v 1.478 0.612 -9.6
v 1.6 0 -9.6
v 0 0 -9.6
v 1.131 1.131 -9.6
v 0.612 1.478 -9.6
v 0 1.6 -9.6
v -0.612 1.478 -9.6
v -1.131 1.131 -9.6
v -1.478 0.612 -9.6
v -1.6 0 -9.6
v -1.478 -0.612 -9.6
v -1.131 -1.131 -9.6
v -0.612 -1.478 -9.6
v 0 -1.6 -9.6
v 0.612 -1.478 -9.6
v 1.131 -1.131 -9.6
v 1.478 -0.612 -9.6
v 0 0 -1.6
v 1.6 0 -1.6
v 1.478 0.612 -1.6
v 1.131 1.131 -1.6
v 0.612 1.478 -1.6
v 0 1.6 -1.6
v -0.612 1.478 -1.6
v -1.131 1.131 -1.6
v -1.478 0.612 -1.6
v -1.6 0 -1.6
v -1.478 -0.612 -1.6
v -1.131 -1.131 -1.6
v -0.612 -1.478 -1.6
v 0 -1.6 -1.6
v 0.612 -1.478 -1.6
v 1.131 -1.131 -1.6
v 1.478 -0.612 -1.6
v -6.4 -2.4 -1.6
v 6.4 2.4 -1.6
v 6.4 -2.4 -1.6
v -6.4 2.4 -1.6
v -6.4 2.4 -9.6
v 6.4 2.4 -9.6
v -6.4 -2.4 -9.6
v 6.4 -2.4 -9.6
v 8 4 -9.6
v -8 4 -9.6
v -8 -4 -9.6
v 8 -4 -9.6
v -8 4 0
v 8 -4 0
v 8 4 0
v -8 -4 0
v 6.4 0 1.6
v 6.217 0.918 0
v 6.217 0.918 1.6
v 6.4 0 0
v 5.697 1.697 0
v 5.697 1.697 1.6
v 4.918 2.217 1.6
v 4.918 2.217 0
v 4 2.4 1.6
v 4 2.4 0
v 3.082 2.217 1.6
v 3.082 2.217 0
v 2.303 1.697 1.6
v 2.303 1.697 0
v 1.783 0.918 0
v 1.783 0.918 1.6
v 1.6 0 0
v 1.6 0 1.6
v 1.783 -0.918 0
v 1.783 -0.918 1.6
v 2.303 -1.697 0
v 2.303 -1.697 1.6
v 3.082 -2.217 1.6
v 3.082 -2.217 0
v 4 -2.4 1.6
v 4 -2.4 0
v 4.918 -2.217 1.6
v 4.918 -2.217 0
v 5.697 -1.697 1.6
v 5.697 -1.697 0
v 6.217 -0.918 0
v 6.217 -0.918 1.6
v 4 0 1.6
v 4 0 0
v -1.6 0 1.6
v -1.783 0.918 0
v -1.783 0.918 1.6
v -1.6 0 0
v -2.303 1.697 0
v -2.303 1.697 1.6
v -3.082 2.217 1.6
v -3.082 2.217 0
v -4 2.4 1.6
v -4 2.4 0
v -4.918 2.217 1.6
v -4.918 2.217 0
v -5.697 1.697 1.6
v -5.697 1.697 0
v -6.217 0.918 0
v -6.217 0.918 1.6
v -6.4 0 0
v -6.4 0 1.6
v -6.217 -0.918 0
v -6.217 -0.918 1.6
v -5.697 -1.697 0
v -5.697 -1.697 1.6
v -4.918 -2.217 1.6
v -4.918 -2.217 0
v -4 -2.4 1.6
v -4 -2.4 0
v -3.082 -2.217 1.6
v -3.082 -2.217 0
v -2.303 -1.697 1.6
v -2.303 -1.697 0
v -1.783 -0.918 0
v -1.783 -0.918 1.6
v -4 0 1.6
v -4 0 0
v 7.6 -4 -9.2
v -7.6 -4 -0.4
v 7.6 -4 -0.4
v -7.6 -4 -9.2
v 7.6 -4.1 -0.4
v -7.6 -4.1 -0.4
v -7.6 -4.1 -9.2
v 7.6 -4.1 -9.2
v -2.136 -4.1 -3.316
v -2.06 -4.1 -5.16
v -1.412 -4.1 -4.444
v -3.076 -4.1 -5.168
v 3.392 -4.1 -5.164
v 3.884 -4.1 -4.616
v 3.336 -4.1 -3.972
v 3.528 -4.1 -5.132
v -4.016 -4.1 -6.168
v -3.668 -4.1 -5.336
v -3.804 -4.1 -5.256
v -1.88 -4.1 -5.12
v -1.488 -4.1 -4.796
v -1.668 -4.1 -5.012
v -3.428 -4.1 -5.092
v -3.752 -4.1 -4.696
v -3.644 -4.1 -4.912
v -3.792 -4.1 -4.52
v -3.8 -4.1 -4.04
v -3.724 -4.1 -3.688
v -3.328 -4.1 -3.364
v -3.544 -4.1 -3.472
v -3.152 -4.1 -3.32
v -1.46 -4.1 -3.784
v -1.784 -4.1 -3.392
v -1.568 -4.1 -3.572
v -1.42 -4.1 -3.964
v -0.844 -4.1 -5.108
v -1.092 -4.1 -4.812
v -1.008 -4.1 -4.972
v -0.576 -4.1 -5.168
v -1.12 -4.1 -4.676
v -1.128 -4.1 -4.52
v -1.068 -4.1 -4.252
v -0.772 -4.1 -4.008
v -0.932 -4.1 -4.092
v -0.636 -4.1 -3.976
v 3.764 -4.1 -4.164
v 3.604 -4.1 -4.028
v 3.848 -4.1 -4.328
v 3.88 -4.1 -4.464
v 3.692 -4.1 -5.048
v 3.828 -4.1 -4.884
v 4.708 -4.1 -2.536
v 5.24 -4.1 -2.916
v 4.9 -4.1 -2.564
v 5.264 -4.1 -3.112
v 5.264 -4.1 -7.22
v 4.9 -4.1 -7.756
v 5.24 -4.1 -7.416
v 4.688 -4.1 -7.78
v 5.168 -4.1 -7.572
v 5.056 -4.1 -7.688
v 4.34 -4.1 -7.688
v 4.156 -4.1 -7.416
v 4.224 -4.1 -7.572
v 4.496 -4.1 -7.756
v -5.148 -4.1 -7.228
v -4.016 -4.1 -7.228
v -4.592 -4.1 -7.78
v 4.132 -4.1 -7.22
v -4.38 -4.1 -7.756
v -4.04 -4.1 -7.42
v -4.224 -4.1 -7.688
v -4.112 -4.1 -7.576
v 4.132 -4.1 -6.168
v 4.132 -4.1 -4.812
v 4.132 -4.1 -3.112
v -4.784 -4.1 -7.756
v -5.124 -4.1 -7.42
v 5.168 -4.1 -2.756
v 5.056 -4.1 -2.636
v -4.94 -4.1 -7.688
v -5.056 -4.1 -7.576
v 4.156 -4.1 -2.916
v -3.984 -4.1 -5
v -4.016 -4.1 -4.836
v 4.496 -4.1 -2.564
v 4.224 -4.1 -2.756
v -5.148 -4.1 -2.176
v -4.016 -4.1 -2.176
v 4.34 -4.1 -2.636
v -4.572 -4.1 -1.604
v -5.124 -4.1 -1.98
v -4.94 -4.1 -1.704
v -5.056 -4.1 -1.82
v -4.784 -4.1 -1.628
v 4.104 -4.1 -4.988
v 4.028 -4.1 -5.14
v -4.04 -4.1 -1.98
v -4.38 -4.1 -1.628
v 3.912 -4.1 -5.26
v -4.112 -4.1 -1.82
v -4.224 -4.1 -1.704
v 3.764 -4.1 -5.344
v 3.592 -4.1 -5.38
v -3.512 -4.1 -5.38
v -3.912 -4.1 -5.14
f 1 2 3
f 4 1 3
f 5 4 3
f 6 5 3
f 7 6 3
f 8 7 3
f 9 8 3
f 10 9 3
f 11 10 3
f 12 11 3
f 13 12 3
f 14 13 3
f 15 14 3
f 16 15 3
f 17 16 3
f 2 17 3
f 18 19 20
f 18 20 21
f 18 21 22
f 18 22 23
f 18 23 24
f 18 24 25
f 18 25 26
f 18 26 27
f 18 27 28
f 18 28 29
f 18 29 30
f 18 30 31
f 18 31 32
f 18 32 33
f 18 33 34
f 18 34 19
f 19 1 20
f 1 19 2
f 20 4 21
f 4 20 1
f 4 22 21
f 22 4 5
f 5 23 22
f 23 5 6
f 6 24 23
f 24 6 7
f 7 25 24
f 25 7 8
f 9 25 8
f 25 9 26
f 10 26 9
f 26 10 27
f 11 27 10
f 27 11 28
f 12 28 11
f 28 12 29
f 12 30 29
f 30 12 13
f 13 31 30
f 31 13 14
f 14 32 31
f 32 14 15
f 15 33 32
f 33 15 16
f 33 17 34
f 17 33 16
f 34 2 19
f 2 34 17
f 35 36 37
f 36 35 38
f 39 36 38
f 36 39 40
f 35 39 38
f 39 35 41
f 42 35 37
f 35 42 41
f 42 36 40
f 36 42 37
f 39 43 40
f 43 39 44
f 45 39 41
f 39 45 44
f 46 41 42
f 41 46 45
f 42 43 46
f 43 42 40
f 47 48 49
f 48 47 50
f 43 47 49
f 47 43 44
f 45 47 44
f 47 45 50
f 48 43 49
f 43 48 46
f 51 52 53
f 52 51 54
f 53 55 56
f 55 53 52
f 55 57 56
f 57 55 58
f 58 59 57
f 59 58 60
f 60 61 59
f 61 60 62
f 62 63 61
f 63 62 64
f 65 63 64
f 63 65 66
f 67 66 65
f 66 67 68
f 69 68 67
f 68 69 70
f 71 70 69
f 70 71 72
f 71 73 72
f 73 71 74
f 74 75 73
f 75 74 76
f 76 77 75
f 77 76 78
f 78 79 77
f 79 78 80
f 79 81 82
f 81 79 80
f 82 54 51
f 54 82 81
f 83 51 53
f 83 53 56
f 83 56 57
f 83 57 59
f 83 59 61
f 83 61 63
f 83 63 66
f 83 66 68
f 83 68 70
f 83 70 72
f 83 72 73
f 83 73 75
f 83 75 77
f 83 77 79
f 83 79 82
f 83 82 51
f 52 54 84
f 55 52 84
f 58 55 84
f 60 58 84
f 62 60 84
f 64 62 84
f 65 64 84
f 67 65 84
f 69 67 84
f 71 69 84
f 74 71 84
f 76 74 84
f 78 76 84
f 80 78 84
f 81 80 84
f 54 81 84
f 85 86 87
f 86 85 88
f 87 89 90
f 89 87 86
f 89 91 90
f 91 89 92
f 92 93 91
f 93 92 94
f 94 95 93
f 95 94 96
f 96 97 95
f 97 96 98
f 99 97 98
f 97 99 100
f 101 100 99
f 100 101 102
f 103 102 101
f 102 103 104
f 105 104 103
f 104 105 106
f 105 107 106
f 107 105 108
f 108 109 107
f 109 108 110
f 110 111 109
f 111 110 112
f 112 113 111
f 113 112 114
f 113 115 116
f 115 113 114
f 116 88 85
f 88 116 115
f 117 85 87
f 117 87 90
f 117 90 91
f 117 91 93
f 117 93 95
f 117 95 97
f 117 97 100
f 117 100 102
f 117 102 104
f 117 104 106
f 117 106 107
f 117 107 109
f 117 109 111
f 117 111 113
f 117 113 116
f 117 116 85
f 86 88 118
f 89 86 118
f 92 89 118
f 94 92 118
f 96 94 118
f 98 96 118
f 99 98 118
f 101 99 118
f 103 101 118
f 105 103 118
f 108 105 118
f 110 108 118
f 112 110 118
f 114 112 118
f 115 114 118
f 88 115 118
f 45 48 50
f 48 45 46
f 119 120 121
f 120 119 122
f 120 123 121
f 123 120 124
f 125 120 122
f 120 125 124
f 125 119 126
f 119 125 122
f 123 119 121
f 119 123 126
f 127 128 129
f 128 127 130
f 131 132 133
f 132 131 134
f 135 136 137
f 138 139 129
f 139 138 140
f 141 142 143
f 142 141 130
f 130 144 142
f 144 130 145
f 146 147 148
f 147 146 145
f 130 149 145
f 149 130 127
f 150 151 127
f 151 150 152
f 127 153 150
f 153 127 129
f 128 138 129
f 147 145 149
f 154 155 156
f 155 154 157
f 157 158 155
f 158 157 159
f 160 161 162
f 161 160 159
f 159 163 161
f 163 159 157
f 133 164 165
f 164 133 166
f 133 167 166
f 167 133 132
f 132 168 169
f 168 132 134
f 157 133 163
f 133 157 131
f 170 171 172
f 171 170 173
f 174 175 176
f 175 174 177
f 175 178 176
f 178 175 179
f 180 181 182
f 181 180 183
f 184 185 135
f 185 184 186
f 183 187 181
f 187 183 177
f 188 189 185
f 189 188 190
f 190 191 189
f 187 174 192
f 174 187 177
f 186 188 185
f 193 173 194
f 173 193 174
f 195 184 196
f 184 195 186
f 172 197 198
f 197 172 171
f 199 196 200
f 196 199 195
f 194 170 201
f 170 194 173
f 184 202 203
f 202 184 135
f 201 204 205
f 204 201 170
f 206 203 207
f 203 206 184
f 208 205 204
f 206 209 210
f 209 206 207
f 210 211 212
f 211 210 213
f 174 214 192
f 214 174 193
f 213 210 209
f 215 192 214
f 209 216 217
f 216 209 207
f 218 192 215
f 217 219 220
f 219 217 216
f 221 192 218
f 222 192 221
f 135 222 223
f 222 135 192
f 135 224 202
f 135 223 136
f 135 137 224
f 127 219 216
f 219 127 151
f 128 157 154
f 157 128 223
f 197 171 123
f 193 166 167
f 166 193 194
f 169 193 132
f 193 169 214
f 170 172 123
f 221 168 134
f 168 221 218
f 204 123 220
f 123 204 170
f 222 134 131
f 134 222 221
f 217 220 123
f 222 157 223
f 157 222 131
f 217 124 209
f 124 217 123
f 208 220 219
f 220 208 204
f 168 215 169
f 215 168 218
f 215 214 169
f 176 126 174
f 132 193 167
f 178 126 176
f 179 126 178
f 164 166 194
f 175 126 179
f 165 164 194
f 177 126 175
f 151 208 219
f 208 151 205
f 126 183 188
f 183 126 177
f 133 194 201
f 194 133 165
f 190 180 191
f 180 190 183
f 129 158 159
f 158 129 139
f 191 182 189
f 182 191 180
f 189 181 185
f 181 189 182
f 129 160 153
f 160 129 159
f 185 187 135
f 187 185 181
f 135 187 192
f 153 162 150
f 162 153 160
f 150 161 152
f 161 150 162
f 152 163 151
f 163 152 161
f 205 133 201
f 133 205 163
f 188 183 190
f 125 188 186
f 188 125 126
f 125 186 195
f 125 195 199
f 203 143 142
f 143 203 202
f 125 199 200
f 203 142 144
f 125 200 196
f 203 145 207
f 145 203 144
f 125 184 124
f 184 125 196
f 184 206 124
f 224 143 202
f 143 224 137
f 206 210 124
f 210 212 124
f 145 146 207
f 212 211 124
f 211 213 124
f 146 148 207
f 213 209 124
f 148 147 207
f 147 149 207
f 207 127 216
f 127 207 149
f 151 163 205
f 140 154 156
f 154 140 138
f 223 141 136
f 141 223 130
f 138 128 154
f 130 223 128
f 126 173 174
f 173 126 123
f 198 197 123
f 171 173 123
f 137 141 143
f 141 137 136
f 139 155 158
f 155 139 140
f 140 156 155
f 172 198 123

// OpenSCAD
// file: ../p/4-4edge.scad
use <../lib.scad>
function ldraw_lib__4_4edge() = [
// 0 Circle 1.0
// 0 Name: 4-4edge.dat
// 0 Author: James Jessiman
// 0 !LDRAW_ORG Primitive UPDATE 2017-01
// 0 !LICENSE Licensed under CC BY 2.0 and CC BY 4.0 : see CAreadme.txt
// 
// 0 BFC CERTIFY CCW
  [0,"BFC","CERTIFY"],
  [0,"BFC","CCW"],
// 
// 0 !HISTORY 1998-12-15 [PTadmin] Official Update 1998-10
// 0 !HISTORY 2005-12-28 [PTadmin] Official Update 2005-01
// 0 !HISTORY 2007-06-24 [PTadmin] Header formatted for Contributor Agreement
// 0 !HISTORY 2008-07-01 [PTadmin] Official Update 2008-01
// 0 !HISTORY 2017-01-15 [Steffen] BFCed
// 0 !HISTORY 2017-12-30 [PTadmin] Official Update 2017-01
// 
// 
// 2 24 1 0 0 0.9239 0 0.3827
  [2,24,1,0,0,0.9239,0,0.3827],
// 2 24 0.9239 0 0.3827 0.7071 0 0.7071
  [2,24,0.9239,0,0.3827,0.7071,0,0.7071],
// 2 24 0.7071 0 0.7071 0.3827 0 0.9239
  [2,24,0.7071,0,0.7071,0.3827,0,0.9239],
// 2 24 0.3827 0 0.9239 0 0 1
  [2,24,0.3827,0,0.9239,0,0,1],
// 2 24 0 0 1 -0.3827 0 0.9239
  [2,24,0,0,1,-0.3827,0,0.9239],
// 2 24 -0.3827 0 0.9239 -0.7071 0 0.7071
  [2,24,-0.3827,0,0.9239,-0.7071,0,0.7071],
// 2 24 -0.7071 0 0.7071 -0.9239 0 0.3827
  [2,24,-0.7071,0,0.7071,-0.9239,0,0.3827],
// 2 24 -0.9239 0 0.3827 -1 0 -0
  [2,24,-0.9239,0,0.3827,-1,0,-0],
// 2 24 -1 0 -0 -0.9239 0 -0.3827
  [2,24,-1,0,-0,-0.9239,0,-0.3827],
// 2 24 -0.9239 0 -0.3827 -0.7071 0 -0.7071
  [2,24,-0.9239,0,-0.3827,-0.7071,0,-0.7071],
// 2 24 -0.7071 0 -0.7071 -0.3827 0 -0.9239
  [2,24,-0.7071,0,-0.7071,-0.3827,0,-0.9239],
// 2 24 -0.3827 0 -0.9239 0 0 -1
  [2,24,-0.3827,0,-0.9239,0,0,-1],
// 2 24 0 0 -1 0.3827 0 -0.9239
  [2,24,0,0,-1,0.3827,0,-0.9239],
// 2 24 0.3827 0 -0.9239 0.7071 0 -0.7071
  [2,24,0.3827,0,-0.9239,0.7071,0,-0.7071],
// 2 24 0.7071 0 -0.7071 0.9239 0 -0.3827
  [2,24,0.7071,0,-0.7071,0.9239,0,-0.3827],
// 2 24 0.9239 0 -0.3827 1 0 0
  [2,24,0.9239,0,-0.3827,1,0,0],
];
module ldraw_lib__4_4edge(step=0, col=false, unit=2/5, alt=false, line=0.2, solid=!$preview)
    makepoly(ldraw_lib__4_4edge(), step=step, col=col, unit=unit, alt=alt, line=line, solid=solid);
ldraw_lib__4_4edge(line=0.2);
// file: ../p/4-4disc.scad
use <../lib.scad>
function ldraw_lib__4_4disc() = [
// 0 Disc 1.0
// 0 Name: 4-4disc.dat
// 0 Author: James Jessiman
// 0 !LDRAW_ORG Primitive UPDATE 2002-02
// 0 !LICENSE Licensed under CC BY 2.0 and CC BY 4.0 : see CAreadme.txt
// 
// 0 BFC CERTIFY CCW
  [0,"BFC","CERTIFY"],
  [0,"BFC","CCW"],
// 
// 0 !HISTORY 1998-12-15 [PTadmin] Official Update 1998-10
// 0 !HISTORY 2002-03-23 [sbliss] Added BFC statement
// 0 !HISTORY 2002-04-25 [PTadmin] Official Update 2002-02
// 0 !HISTORY 2007-06-24 [PTadmin] Header formatted for Contributor Agreement
// 0 !HISTORY 2008-07-01 [PTadmin] Official Update 2008-01
// 
// 
// 3 16 0 0 0 1 0 0 0.9239 0 0.3827
  [3,16,0,0,0,1,0,0,0.9239,0,0.3827],
// 3 16 0 0 0 0.9239 0 0.3827 0.7071 0 0.7071
  [3,16,0,0,0,0.9239,0,0.3827,0.7071,0,0.7071],
// 3 16 0 0 0 0.7071 0 0.7071 0.3827 0 0.9239
  [3,16,0,0,0,0.7071,0,0.7071,0.3827,0,0.9239],
// 3 16 0 0 0 0.3827 0 0.9239 0 0 1
  [3,16,0,0,0,0.3827,0,0.9239,0,0,1],
// 3 16 0 0 0 0 0 1 -0.3827 0 0.9239
  [3,16,0,0,0,0,0,1,-0.3827,0,0.9239],
// 3 16 0 0 0 -0.3827 0 0.9239 -0.7071 0 0.7071
  [3,16,0,0,0,-0.3827,0,0.9239,-0.7071,0,0.7071],
// 3 16 0 0 0 -0.7071 0 0.7071 -0.9239 0 0.3827
  [3,16,0,0,0,-0.7071,0,0.7071,-0.9239,0,0.3827],
// 3 16 0 0 0 -0.9239 0 0.3827 -1 0 -0
  [3,16,0,0,0,-0.9239,0,0.3827,-1,0,-0],
// 3 16 0 0 0 -1 0 -0 -0.9239 0 -0.3827
  [3,16,0,0,0,-1,0,-0,-0.9239,0,-0.3827],
// 3 16 0 0 0 -0.9239 0 -0.3827 -0.7071 0 -0.7071
  [3,16,0,0,0,-0.9239,0,-0.3827,-0.7071,0,-0.7071],
// 3 16 0 0 0 -0.7071 0 -0.7071 -0.3827 0 -0.9239
  [3,16,0,0,0,-0.7071,0,-0.7071,-0.3827,0,-0.9239],
// 3 16 0 0 0 -0.3827 0 -0.9239 0 0 -1
  [3,16,0,0,0,-0.3827,0,-0.9239,0,0,-1],
// 3 16 0 0 0 0 0 -1 0.3827 0 -0.9239
  [3,16,0,0,0,0,0,-1,0.3827,0,-0.9239],
// 3 16 0 0 0 0.3827 0 -0.9239 0.7071 0 -0.7071
  [3,16,0,0,0,0.3827,0,-0.9239,0.7071,0,-0.7071],
// 3 16 0 0 0 0.7071 0 -0.7071 0.9239 0 -0.3827
  [3,16,0,0,0,0.7071,0,-0.7071,0.9239,0,-0.3827],
// 3 16 0 0 0 0.9239 0 -0.3827 1 0 0
  [3,16,0,0,0,0.9239,0,-0.3827,1,0,0],
// 0
];
module ldraw_lib__4_4disc(step=0, col=false, unit=2/5, alt=false, line=0.2, solid=!$preview)
    makepoly(ldraw_lib__4_4disc(), step=step, col=col, unit=unit, alt=alt, line=line, solid=solid);
ldraw_lib__4_4disc(line=0.2);
// file: ../p/4-4cyli.scad
use <../lib.scad>
$fa=1; $fs=0.2;
function ldraw_lib__4_4cyli(realsolid=false) = [
// 0 Cylinder 1.0
// 0 Name: 4-4cyli.dat
// 0 Author: James Jessiman
// 0 !LDRAW_ORG Primitive UPDATE 2005-01
// 0 !LICENSE Licensed under CC BY 2.0 and CC BY 4.0 : see CAreadme.txt
// 
// 0 BFC CERTIFY CCW
  [0,"BFC","CERTIFY"],
  [0,"BFC","CCW"],
// 
// 0 !HISTORY 1998-12-15 [PTadmin] Official Update 1998-10
// 0 !HISTORY 2002-03-23 [sbliss] Added BFC statement; merged headers from files in distributions LDraw 0.27 and Complete.
// 0 !HISTORY 2002-04-25 [PTadmin] Official Update 2002-02
// 0 !HISTORY 2004-12-14 [guyvivan] BFC CCW
// 0 !HISTORY 2005-12-28 [PTadmin] Official Update 2005-01
// 0 !HISTORY 2007-06-24 [PTadmin] Header formatted for Contributor Agreement
// 0 !HISTORY 2008-07-01 [PTadmin] Official Update 2008-01
// 
// 
// 4 16 1 1 0 0.9239 1 0.3827 0.9239 0 0.3827 1 0 0
  [4,16,1,1,0,0.9239,1,0.3827,0.9239,0,0.3827,1,0,0],
// 5 24 1 0 0 1 1 0 0.9239 0 0.3827 0.9239 0 -0.3827
  [5,24,1,0,0,1,1,0,0.9239,0,0.3827,0.9239,0,-0.3827],
// 4 16 0.9239 1 0.3827 0.7071 1 0.7071 0.7071 0 0.7071 0.9239 0 0.3827
  [4,16,0.9239,1,0.3827,0.7071,1,0.7071,0.7071,0,0.7071,0.9239,0,0.3827],
// 5 24 0.9239 0 0.3827 0.9239 1 0.3827 0.7071 0 0.7071 1 0 0
  [5,24,0.9239,0,0.3827,0.9239,1,0.3827,0.7071,0,0.7071,1,0,0],
// 4 16 0.7071 1 0.7071 0.3827 1 0.9239 0.3827 0 0.9239 0.7071 0 0.7071
  [4,16,0.7071,1,0.7071,0.3827,1,0.9239,0.3827,0,0.9239,0.7071,0,0.7071],
// 5 24 0.7071 0 0.7071 0.7071 1 0.7071 0.3827 0 0.9239 0.9239 0 0.3827
  [5,24,0.7071,0,0.7071,0.7071,1,0.7071,0.3827,0,0.9239,0.9239,0,0.3827],
// 4 16 0.3827 1 0.9239 0 1 1 0 0 1 0.3827 0 0.9239
  [4,16,0.3827,1,0.9239,0,1,1,0,0,1,0.3827,0,0.9239],
// 5 24 0.3827 0 0.9239 0.3827 1 0.9239 0 0 1 0.7071 0 0.7071
  [5,24,0.3827,0,0.9239,0.3827,1,0.9239,0,0,1,0.7071,0,0.7071],
// 4 16 0 1 1 -0.3827 1 0.9239 -0.3827 0 0.9239 0 0 1
  [4,16,0,1,1,-0.3827,1,0.9239,-0.3827,0,0.9239,0,0,1],
// 5 24 0 0 1 0 1 1 -0.3827 0 0.9239 0.3827 0 0.9239
  [5,24,0,0,1,0,1,1,-0.3827,0,0.9239,0.3827,0,0.9239],
// 4 16 -0.3827 1 0.9239 -0.7071 1 0.7071 -0.7071 0 0.7071 -0.3827 0 0.9239
  [4,16,-0.3827,1,0.9239,-0.7071,1,0.7071,-0.7071,0,0.7071,-0.3827,0,0.9239],
// 5 24 -0.3827 0 0.9239 -0.3827 1 0.9239 -0.7071 0 0.7071 0 0 1
  [5,24,-0.3827,0,0.9239,-0.3827,1,0.9239,-0.7071,0,0.7071,0,0,1],
// 4 16 -0.7071 1 0.7071 -0.9239 1 0.3827 -0.9239 0 0.3827 -0.7071 0 0.7071
  [4,16,-0.7071,1,0.7071,-0.9239,1,0.3827,-0.9239,0,0.3827,-0.7071,0,0.7071],
// 5 24 -0.7071 0 0.7071 -0.7071 1 0.7071 -0.9239 0 0.3827 -0.3827 0 0.9239
  [5,24,-0.7071,0,0.7071,-0.7071,1,0.7071,-0.9239,0,0.3827,-0.3827,0,0.9239],
// 4 16 -0.9239 1 0.3827 -1 1 0 -1 0 0 -0.9239 0 0.3827
  [4,16,-0.9239,1,0.3827,-1,1,0,-1,0,0,-0.9239,0,0.3827],
// 5 24 -0.9239 0 0.3827 -0.9239 1 0.3827 -1 0 0 -0.7071 0 0.7071
  [5,24,-0.9239,0,0.3827,-0.9239,1,0.3827,-1,0,0,-0.7071,0,0.7071],
// 4 16 -1 1 0 -0.9239 1 -0.3827 -0.9239 0 -0.3827 -1 0 0
  [4,16,-1,1,0,-0.9239,1,-0.3827,-0.9239,0,-0.3827,-1,0,0],
// 5 24 -1 0 0 -1 1 0 -0.9239 0 -0.3827 -0.9239 0 0.3827
  [5,24,-1,0,0,-1,1,0,-0.9239,0,-0.3827,-0.9239,0,0.3827],
// 4 16 -0.9239 1 -0.3827 -0.7071 1 -0.7071 -0.7071 0 -0.7071 -0.9239 0 -0.3827
  [4,16,-0.9239,1,-0.3827,-0.7071,1,-0.7071,-0.7071,0,-0.7071,-0.9239,0,-0.3827],
// 5 24 -0.9239 0 -0.3827 -0.9239 1 -0.3827 -0.7071 0 -0.7071 -1 0 0
  [5,24,-0.9239,0,-0.3827,-0.9239,1,-0.3827,-0.7071,0,-0.7071,-1,0,0],
// 4 16 -0.7071 1 -0.7071 -0.3827 1 -0.9239 -0.3827 0 -0.9239 -0.7071 0 -0.7071
  [4,16,-0.7071,1,-0.7071,-0.3827,1,-0.9239,-0.3827,0,-0.9239,-0.7071,0,-0.7071],
// 5 24 -0.7071 0 -0.7071 -0.7071 1 -0.7071 -0.3827 0 -0.9239 -0.9239 0 -0.3827
  [5,24,-0.7071,0,-0.7071,-0.7071,1,-0.7071,-0.3827,0,-0.9239,-0.9239,0,-0.3827],
// 4 16 -0.3827 1 -0.9239 0 1 -1 0 0 -1 -0.3827 0 -0.9239
  [4,16,-0.3827,1,-0.9239,0,1,-1,0,0,-1,-0.3827,0,-0.9239],
// 5 24 -0.3827 0 -0.9239 -0.3827 1 -0.9239 0 0 -1 -0.7071 0 -0.7071
  [5,24,-0.3827,0,-0.9239,-0.3827,1,-0.9239,0,0,-1,-0.7071,0,-0.7071],
// 4 16 0 1 -1 0.3827 1 -0.9239 0.3827 0 -0.9239 0 0 -1
  [4,16,0,1,-1,0.3827,1,-0.9239,0.3827,0,-0.9239,0,0,-1],
// 5 24 0 0 -1 0 1 -1 0.3827 0 -0.9239 -0.3827 0 -0.9239
  [5,24,0,0,-1,0,1,-1,0.3827,0,-0.9239,-0.3827,0,-0.9239],
// 4 16 0.3827 1 -0.9239 0.7071 1 -0.7071 0.7071 0 -0.7071 0.3827 0 -0.9239
  [4,16,0.3827,1,-0.9239,0.7071,1,-0.7071,0.7071,0,-0.7071,0.3827,0,-0.9239],
// 5 24 0.3827 0 -0.9239 0.3827 1 -0.9239 0.7071 0 -0.7071 0 0 -1
  [5,24,0.3827,0,-0.9239,0.3827,1,-0.9239,0.7071,0,-0.7071,0,0,-1],
// 4 16 0.7071 1 -0.7071 0.9239 1 -0.3827 0.9239 0 -0.3827 0.7071 0 -0.7071
  [4,16,0.7071,1,-0.7071,0.9239,1,-0.3827,0.9239,0,-0.3827,0.7071,0,-0.7071],
// 5 24 0.7071 0 -0.7071 0.7071 1 -0.7071 0.9239 0 -0.3827 0.3827 0 -0.9239
  [5,24,0.7071,0,-0.7071,0.7071,1,-0.7071,0.9239,0,-0.3827,0.3827,0,-0.9239],
// 4 16 0.9239 1 -0.3827 1 1 0 1 0 0 0.9239 0 -0.3827
  [4,16,0.9239,1,-0.3827,1,1,0,1,0,0,0.9239,0,-0.3827],
// 5 24 0.9239 0 -0.3827 0.9239 1 -0.3827 1 0 0 0.7071 0 -0.7071
  [5,24,0.9239,0,-0.3827,0.9239,1,-0.3827,1,0,0,0.7071,0,-0.7071],
// 0
];
module ldraw_lib__4_4cyli(step=0, col=false, unit=2/5, alt=false, line=0.2, solid=!$preview)
    makepoly(ldraw_lib__4_4cyli(solid), step=step, col=col, unit=unit, alt=alt, line=line, solid=solid);
ldraw_lib__4_4cyli(line=0.2);
// file: ../p/stud3.scad
use <../lib.scad>
use <4-4cyli.scad>
use <4-4disc.scad>
use <4-4edge.scad>
function ldraw_lib__stud3() = [
// 0 Stud Tube Solid
// 0 Name: stud3.dat
// 0 Author: James Jessiman
// 0 !LDRAW_ORG Primitive UPDATE 2012-01
// 0 !LICENSE Licensed under CC BY 4.0 : see CAreadme.txt
// 
// 0 BFC CERTIFY CCW
  [0,"BFC","CERTIFY"],
  [0,"BFC","CCW"],
// 
// 0 !HISTORY 2002-04-04 [sbliss] Modified for BFC compliance
// 0 !HISTORY 2002-04-25 [PTadmin] Official Update 2002-02
// 0 !HISTORY 2007-06-24 [PTadmin] Header formatted for Contributor Agreement
// 0 !HISTORY 2008-07-01 [PTadmin] Official Update 2008-01
// 0 !HISTORY 2012-02-16 [Philo] Changed to CCW
// 0 !HISTORY 2012-03-30 [PTadmin] Official Update 2012-01
// 
// 
// 1 16 0 -4 0 4 0 0 0 1 0 0 0 4 4-4edge.dat
  [1,16,0,-4,0,4,0,0,0,1,0,0,0,4, ldraw_lib__4_4edge()],
// 1 16 0 0 0 4 0 0 0 1 0 0 0 4 4-4edge.dat
  [1,16,0,0,0,4,0,0,0,1,0,0,0,4, ldraw_lib__4_4edge()],
// 1 16 0 -4 0 4 0 0 0 1 0 0 0 4 4-4disc.dat
  [1,16,0,-4,0,4,0,0,0,1,0,0,0,4, ldraw_lib__4_4disc()],
  [-1,16,0,0,0,4,0,0,0,-1,0,0,0,4, ldraw_lib__4_4disc()],
// 1 16 0 -4 0 4 0 0 0 4 0 0 0 4 4-4cyli.dat
  [1,16,0,-4,0,4,0,0,0,4,0,0,0,4, ldraw_lib__4_4cyli()],
];
module ldraw_lib__stud3(step=0, col=false, unit=2/5, alt=false, line=0.2, solid=!$preview)
    makepoly(ldraw_lib__stud3(), step=step, col=col, unit=unit, alt=alt, line=line, solid=solid);
ldraw_lib__stud3(line=0.2);
// file: ../p/stud.scad
use <../lib.scad>
use <4-4cyli.scad>
use <4-4disc.scad>
use <4-4edge.scad>
function ldraw_lib__stud() = [
// 0 Stud
// 0 Name: stud.dat
// 0 Author: James Jessiman
// 0 !LDRAW_ORG Primitive UPDATE 2012-01
// 0 !LICENSE Licensed under CC BY 4.0 : see CAreadme.txt
// 
// 0 BFC CERTIFY CCW
  [0,"BFC","CERTIFY"],
  [0,"BFC","CCW"],
// 
// 0 !HISTORY 2002-04-04 [sbliss] Modified for BFC compliance
// 0 !HISTORY 2002-04-25 [PTadmin] Official Update 2002-02
// 0 !HISTORY 2007-06-24 [PTadmin] Header formatted for Contributor Agreement
// 0 !HISTORY 2008-07-01 [PTadmin] Official Update 2008-01
// 0 !HISTORY 2012-02-16 [Philo] Changed to CCW
// 0 !HISTORY 2012-03-30 [PTadmin] Official Update 2012-01
// 
// 
// 1 16 0 0 0 6 0 0 0 1 0 0 0 6 4-4edge.dat
  [1,16,0,0,0,6,0,0,0,1,0,0,0,6, ldraw_lib__4_4edge()],
// 1 16 0 -4 0 6 0 0 0 1 0 0 0 6 4-4edge.dat
  [1,16,0,-4,0,6,0,0,0,1,0,0,0,6, ldraw_lib__4_4edge()],
// 1 16 0 0 0 6 0 0 0 -4 0 0 0 6 4-4cyli.dat
  [1,16,0,0,0,6,0,0,0,-4,0,0,0,6, ldraw_lib__4_4cyli()],
// 1 16 0 -4 0 6 0 0 0 1 0 0 0 6 4-4disc.dat
  [1,16,0,-4,0,6,0,0,0,1,0,0,0,6, ldraw_lib__4_4disc()],
  [-1,16,0,0,0,6,0,0,0,-1,0,0,0,6, ldraw_lib__4_4disc()],
];
module ldraw_lib__stud(step=0, col=false, unit=2/5, alt=false, line=0.2, solid=!$preview)
    makepoly(ldraw_lib__stud(), step=step, col=col, unit=unit, alt=alt, line=line, solid=solid);
ldraw_lib__stud(line=0.2);
// file: ../p/box5.scad
use <../lib.scad>
function ldraw_lib__box5() = [
// 0 Box with 5 Faces and All Edges
// 0 Name: box5.dat
// 0 Author: James Jessiman
// 0 !LDRAW_ORG Primitive UPDATE 2012-01
// 0 !LICENSE Licensed under CC BY 2.0 and CC BY 4.0 : see CAreadme.txt
// 
// 0 BFC CERTIFY CCW
  [0,"BFC","CERTIFY"],
  [0,"BFC","CCW"],
// 
// 0 !HISTORY 2002-04-03 [sbliss] Modified for BFC compliance
// 0 !HISTORY 2002-04-25 [PTadmin] Official Update 2002-02
// 0 !HISTORY 2007-06-24 [PTadmin] Header formatted for Contributor Agreement
// 0 !HISTORY 2008-07-01 [PTadmin] Official Update 2008-01
// 0 !HISTORY 2012-02-16 [Philo] Changed to CCW
// 0 !HISTORY 2012-03-30 [PTadmin] Official Update 2012-01
// 
// 
// 2 24 1 1 1 -1 1 1
  [2,24,1,1,1,-1,1,1],
// 2 24 -1 1 1 -1 1 -1
  [2,24,-1,1,1,-1,1,-1],
// 2 24 -1 1 -1 1 1 -1
  [2,24,-1,1,-1,1,1,-1],
// 2 24 1 1 -1 1 1 1
  [2,24,1,1,-1,1,1,1],
// 2 24 1 0 1 -1 0 1
  [2,24,1,0,1,-1,0,1],
// 2 24 -1 0 1 -1 0 -1
  [2,24,-1,0,1,-1,0,-1],
// 2 24 -1 0 -1 1 0 -1
  [2,24,-1,0,-1,1,0,-1],
// 2 24 1 0 -1 1 0 1
  [2,24,1,0,-1,1,0,1],
// 2 24 1 0 1 1 1 1
  [2,24,1,0,1,1,1,1],
// 2 24 -1 0 1 -1 1 1
  [2,24,-1,0,1,-1,1,1],
// 2 24 1 0 -1 1 1 -1
  [2,24,1,0,-1,1,1,-1],
// 2 24 -1 0 -1 -1 1 -1
  [2,24,-1,0,-1,-1,1,-1],
// 4 16 -1 1 1 1 1 1 1 1 -1 -1 1 -1
  [4,16,-1,1,1,1,1,1,1,1,-1,-1,1,-1],
// 4 16 -1 1 1 -1 0 1 1 0 1 1 1 1
  [4,16,-1,1,1,-1,0,1,1,0,1,1,1,1],
// 4 16 -1 1 -1 -1 0 -1 -1 0 1 -1 1 1
  [4,16,-1,1,-1,-1,0,-1,-1,0,1,-1,1,1],
// 4 16 1 1 -1 1 0 -1 -1 0 -1 -1 1 -1
  [4,16,1,1,-1,1,0,-1,-1,0,-1,-1,1,-1],
// 4 16 1 1 1 1 0 1 1 0 -1 1 1 -1
  [4,16,1,1,1,1,0,1,1,0,-1,1,1,-1],
];
makepoly(ldraw_lib__box5(), line=0.2);
// file: ../p/box4t.scad
use <../lib.scad>
function ldraw_lib__box4t() = [
// 0 Box with 4 Adjacent Faces and All Edges
// 0 Name: box4t.dat
// 0 Author: Tore Eriksson [Tore_Eriksson]
// 0 !LDRAW_ORG Primitive UPDATE 2003-02
// 0 !LICENSE Licensed under CC BY 2.0 and CC BY 4.0 : see CAreadme.txt
// 
// 0 BFC CERTIFY CCW
  [0,"BFC","CERTIFY"],
  [0,"BFC","CCW"],
// 
// 0 !HISTORY 1997-09-29 [PTadmin] Official Update 1997-15
// 0 !HISTORY 2002-08-31 [izanette] Modified with WINDZ for BFC compliance
// 0 !HISTORY 2003-08-01 [PTadmin] Official Update 2003-02
// 0 !HISTORY 2007-06-24 [PTadmin] Header formatted for Contributor Agreement
// 0 !HISTORY 2008-07-01 [PTadmin] Official Update 2008-01
// 
// 
// 2 24 1 1 1 -1 1 1
  [2,24,1,1,1,-1,1,1],
// 2 24 -1 1 1 -1 1 -1
  [2,24,-1,1,1,-1,1,-1],
// 2 24 -1 1 -1 1 1 -1
  [2,24,-1,1,-1,1,1,-1],
// 2 24 1 1 -1 1 1 1
  [2,24,1,1,-1,1,1,1],
// 2 24 1 0 1 -1 0 1
  [2,24,1,0,1,-1,0,1],
// 2 24 -1 0 1 -1 0 -1
  [2,24,-1,0,1,-1,0,-1],
// 2 24 -1 0 -1 1 0 -1
  [2,24,-1,0,-1,1,0,-1],
// 2 24 1 0 -1 1 0 1
  [2,24,1,0,-1,1,0,1],
// 2 24 1 0 1 1 1 1
  [2,24,1,0,1,1,1,1],
// 2 24 -1 0 1 -1 1 1
  [2,24,-1,0,1,-1,1,1],
// 2 24 1 0 -1 1 1 -1
  [2,24,1,0,-1,1,1,-1],
// 2 24 -1 0 -1 -1 1 -1
  [2,24,-1,0,-1,-1,1,-1],
// 4 16 1 1 1 1 1 -1 -1 1 -1 -1 1 1
  [4,16,1,1,1,1,1,-1,-1,1,-1,-1,1,1],
// 4 16 1 1 1 -1 1 1 -1 0 1 1 0 1
  [4,16,1,1,1,-1,1,1,-1,0,1,1,0,1],
// 4 16 -1 1 1 -1 1 -1 -1 0 -1 -1 0 1
  [4,16,-1,1,1,-1,1,-1,-1,0,-1,-1,0,1],
// 0 4 16 -1 1 -1 -1 0 -1 1 0 -1 1 1 -1
// 4 16 1 1 -1 1 1 1 1 0 1 1 0 -1
  [4,16,1,1,-1,1,1,1,1,0,1,1,0,-1],
// 0
];
makepoly(ldraw_lib__box4t(), line=0.2);
// file: s/3004s01.scad
use <../../lib.scad>
use <../../p/box4t.scad>
use <../../p/box5.scad>
use <../../p/stud.scad>
use <../../p/stud3.scad>
$fa=1; $fs=0.2;
function ldraw_lib__s__3004s01(realsolid=false) = [
// 0 ~Brick  1 x  2 without Front Face
// 0 Name: s\3004s01.dat
// 0 Author: James Jessiman
// 0 !LDRAW_ORG Subpart UPDATE 2003-03
// 0 !LICENSE Licensed under CC BY 2.0 and CC BY 4.0 : see CAreadme.txt
// 
// 0 BFC CERTIFY CCW
  [0,"BFC","CERTIFY"],
  [0,"BFC","CCW"],
// 
// 0 !HISTORY 2003-09-07 [jriley] Subfiling, BFC
// 0 !HISTORY 2003-12-19 [PTadmin] Official Update 2003-03
// 0 !HISTORY 2007-08-29 [PTadmin] Header formatted for Contributor Agreement
// 0 !HISTORY 2008-07-01 [PTadmin] Official Update 2008-01
// 
// 
// 1 16 0 4 0 1 0 0 0 -5 0 0 0 1 stud3.dat
  [1,16,0,4,0,1,0,0,0,-5,0,0,0,1, ldraw_lib__stud3(realsolid)],
// 0 BFC INVERTNEXT
  [0,"BFC","INVERTNEXT"],
// 1 16 0 24 0 16 0 0 0 -20 0 0 0 6 box5.dat
  [1,16,0,24,0,16,0,0,0,-20,0,0,0,6, ldraw_lib__box5(realsolid)],
// 4 16 20 24 10 16 24 6 -16 24 6 -20 24 10
  [4,16,20,24,10,16,24,6,-16,24,6,-20,24,10],
// 4 16 -20 24 10 -16 24 6 -16 24 -6 -20 24 -10
  [4,16,-20,24,10,-16,24,6,-16,24,-6,-20,24,-10],
// 4 16 -20 24 -10 -16 24 -6 16 24 -6 20 24 -10
  [4,16,-20,24,-10,-16,24,-6,16,24,-6,20,24,-10],
// 4 16 20 24 -10 16 24 -6 16 24 6 20 24 10
  [4,16,20,24,-10,16,24,-6,16,24,6,20,24,10],
// 1 16 0 24 0 20 0 0 0 -24 0 0 0 10 box4t.dat
  [1,16,0,24,0,20,0,0,0,-24,0,0,0,10, ldraw_lib__box4t(realsolid)],
// 1 16 10 0 0 1 0 0 0 1 0 0 0 1 stud.dat
  [1,16,10,0,0,1,0,0,0,1,0,0,0,1, ldraw_lib__stud(realsolid)],
// 1 16 -10 0 0 1 0 0 0 1 0 0 0 1 stud.dat
  [1,16,-10,0,0,1,0,0,0,1,0,0,0,1, ldraw_lib__stud(realsolid)],
// 0
];
module ldraw_lib__s__3004s01(step=0, col=false, unit=2/5, alt=false, line=0.2, solid=!$preview)
    makepoly(ldraw_lib__s__3004s01(solid), step=step, col=col, unit=unit, alt=alt, line=line, solid=solid);
ldraw_lib__s__3004s01(line=0.2);
// file: ../p/box5-12.scad
use <../lib.scad>
function ldraw_lib__box5_12() = [
// 0 Box with 5 Faces without Any Edges
// 0 Name: box5-12.dat
// 0 Author: Chris Dee [cwdee]
// 0 !LDRAW_ORG Primitive UPDATE 2009-02
// 0 !LICENSE Licensed under CC BY 2.0 and CC BY 4.0 : see CAreadme.txt
// 
// 0 BFC CERTIFY CCW
  [0,"BFC","CERTIFY"],
  [0,"BFC","CCW"],
// 
// 0 !HISTORY 2009-09-03 [PTadmin] Official Update 2009-02
// 
// 
// 4 16 1 1 1 1 1 -1 -1 1 -1 -1 1 1
  [4,16,1,1,1,1,1,-1,-1,1,-1,-1,1,1],
// 4 16 -1 0 1 1 0 1 1 1 1 -1 1 1
  [4,16,-1,0,1,1,0,1,1,1,1,-1,1,1],
// 4 16 -1 0 -1 -1 0 1 -1 1 1 -1 1 -1
  [4,16,-1,0,-1,-1,0,1,-1,1,1,-1,1,-1],
// 4 16 1 0 -1 -1 0 -1 -1 1 -1 1 1 -1
  [4,16,1,0,-1,-1,0,-1,-1,1,-1,1,1,-1],
// 4 16 1 0 1 1 0 -1 1 1 -1 1 1 1
  [4,16,1,0,1,1,0,-1,1,1,-1,1,1,1],
// 0
];
module ldraw_lib__box5_12(step=0, col=false, unit=2/5, alt=false, line=0.2, solid=!$preview)
    makepoly(ldraw_lib__box5_12(), step=step, col=col, unit=unit, alt=alt, line=line, solid=solid);
ldraw_lib__box5_12(line=0.2);
// file: 3004.scad
use <../lib.scad>
use <s/3004s01.scad>
function ldraw_lib__3004() = [
// 0 Brick  1 x  2
// 0 Name: 3004.dat
// 0 Author: James Jessiman
// 0 !LDRAW_ORG Part UPDATE 2022-05
// 0 !LICENSE Licensed under CC BY 2.0 and CC BY 4.0 : see CAreadme.txt
// 
// 0 BFC CERTIFY CCW
  [0,"BFC","CERTIFY"],
  [0,"BFC","CCW"],
// 
// 0 !HISTORY 2001-10-26 [PTadmin] Official Update 2001-01
// 0 !HISTORY 2002-05-07 {unknown} BFC Certification
// 0 !HISTORY 2002-06-11 [PTadmin] Official Update 2002-03
// 0 !HISTORY 2007-05-07 [PTadmin] Header formatted for Contributor Agreement
// 0 !HISTORY 2008-07-01 [PTadmin] Official Update 2008-01
// 0 !HISTORY 2022-08-04 [MagFors] Using subfile
// 0 !HISTORY 2022-09-15 [PTadmin] Official Update 2022-05
// 
// 
// 1 16 0 0 0 1 0 0 0 1 0 0 0 1 s\3004s01.dat
  [1,16,0,0,0,1,0,0,0,1,0,0,0,1, ldraw_lib__s__3004s01()],
// 4 16 -20 24 -10 20 24 -10 20 0 -10 -20 0 -10
  [4,16,-20,24,-10,20,24,-10,20,0,-10,-20,0,-10],
];
module ldraw_lib__3004(step=0, col=false, unit=2/5, alt=false, line=0.2, solid=!$preview)
    makepoly(ldraw_lib__3004(), step=step, col=col, unit=unit, alt=alt, line=line, solid=solid);
ldraw_lib__3004(line=0.2);
// main file
use <../lib.scad>
use <164565c.scad>
use <3004.scad>
function ldraw_lib__3004d12() = [
// 0 Brick  1 x  2 with Blue Bed Icon Sticker
// 0 Name: 3004d12.dat
// 0 Author: Takeshi Takahashi [RainbowDolphin]
// 0 !LDRAW_ORG Shortcut UPDATE 2024-07
// 0 !LICENSE Licensed under CC BY 4.0 : see CAreadme.txt
// 
// 0 BFC CERTIFY CCW
  [0,"BFC","CERTIFY"],
  [0,"BFC","CCW"],
// 
// 0 !CATEGORY Sticker Shortcut
// 0 !KEYWORDS Bricklink 3004pb014, set 10001, Set 4558, Sleeping car, Train
// 
// 0 !HISTORY 2024-08-26 [OrionP] Official Update 2024-07
// 
// 1 16 0 0 0 1 0 0 0 1 0 0 0 1 3004.dat
  [1,16,0,0,0,1,0,0,0,1,0,0,0,1, ldraw_lib__3004()],
// 1 16 0 12 -10 1 0 0 0 0 -1 0 1 0 164565c.dat
  [1,16,0,12,-10,1,0,0,0,0,-1,0,1,0, ldraw_lib__164565c()],
];
module ldraw_lib__3004d12(step=0, col=false, unit=2/5, alt=false, line=0.2, solid=!$preview)
    makepoly(ldraw_lib__3004d12(), step=step, col=col, unit=unit, alt=alt, line=line, solid=solid);
ldraw_lib__3004d12(line=0.2);
